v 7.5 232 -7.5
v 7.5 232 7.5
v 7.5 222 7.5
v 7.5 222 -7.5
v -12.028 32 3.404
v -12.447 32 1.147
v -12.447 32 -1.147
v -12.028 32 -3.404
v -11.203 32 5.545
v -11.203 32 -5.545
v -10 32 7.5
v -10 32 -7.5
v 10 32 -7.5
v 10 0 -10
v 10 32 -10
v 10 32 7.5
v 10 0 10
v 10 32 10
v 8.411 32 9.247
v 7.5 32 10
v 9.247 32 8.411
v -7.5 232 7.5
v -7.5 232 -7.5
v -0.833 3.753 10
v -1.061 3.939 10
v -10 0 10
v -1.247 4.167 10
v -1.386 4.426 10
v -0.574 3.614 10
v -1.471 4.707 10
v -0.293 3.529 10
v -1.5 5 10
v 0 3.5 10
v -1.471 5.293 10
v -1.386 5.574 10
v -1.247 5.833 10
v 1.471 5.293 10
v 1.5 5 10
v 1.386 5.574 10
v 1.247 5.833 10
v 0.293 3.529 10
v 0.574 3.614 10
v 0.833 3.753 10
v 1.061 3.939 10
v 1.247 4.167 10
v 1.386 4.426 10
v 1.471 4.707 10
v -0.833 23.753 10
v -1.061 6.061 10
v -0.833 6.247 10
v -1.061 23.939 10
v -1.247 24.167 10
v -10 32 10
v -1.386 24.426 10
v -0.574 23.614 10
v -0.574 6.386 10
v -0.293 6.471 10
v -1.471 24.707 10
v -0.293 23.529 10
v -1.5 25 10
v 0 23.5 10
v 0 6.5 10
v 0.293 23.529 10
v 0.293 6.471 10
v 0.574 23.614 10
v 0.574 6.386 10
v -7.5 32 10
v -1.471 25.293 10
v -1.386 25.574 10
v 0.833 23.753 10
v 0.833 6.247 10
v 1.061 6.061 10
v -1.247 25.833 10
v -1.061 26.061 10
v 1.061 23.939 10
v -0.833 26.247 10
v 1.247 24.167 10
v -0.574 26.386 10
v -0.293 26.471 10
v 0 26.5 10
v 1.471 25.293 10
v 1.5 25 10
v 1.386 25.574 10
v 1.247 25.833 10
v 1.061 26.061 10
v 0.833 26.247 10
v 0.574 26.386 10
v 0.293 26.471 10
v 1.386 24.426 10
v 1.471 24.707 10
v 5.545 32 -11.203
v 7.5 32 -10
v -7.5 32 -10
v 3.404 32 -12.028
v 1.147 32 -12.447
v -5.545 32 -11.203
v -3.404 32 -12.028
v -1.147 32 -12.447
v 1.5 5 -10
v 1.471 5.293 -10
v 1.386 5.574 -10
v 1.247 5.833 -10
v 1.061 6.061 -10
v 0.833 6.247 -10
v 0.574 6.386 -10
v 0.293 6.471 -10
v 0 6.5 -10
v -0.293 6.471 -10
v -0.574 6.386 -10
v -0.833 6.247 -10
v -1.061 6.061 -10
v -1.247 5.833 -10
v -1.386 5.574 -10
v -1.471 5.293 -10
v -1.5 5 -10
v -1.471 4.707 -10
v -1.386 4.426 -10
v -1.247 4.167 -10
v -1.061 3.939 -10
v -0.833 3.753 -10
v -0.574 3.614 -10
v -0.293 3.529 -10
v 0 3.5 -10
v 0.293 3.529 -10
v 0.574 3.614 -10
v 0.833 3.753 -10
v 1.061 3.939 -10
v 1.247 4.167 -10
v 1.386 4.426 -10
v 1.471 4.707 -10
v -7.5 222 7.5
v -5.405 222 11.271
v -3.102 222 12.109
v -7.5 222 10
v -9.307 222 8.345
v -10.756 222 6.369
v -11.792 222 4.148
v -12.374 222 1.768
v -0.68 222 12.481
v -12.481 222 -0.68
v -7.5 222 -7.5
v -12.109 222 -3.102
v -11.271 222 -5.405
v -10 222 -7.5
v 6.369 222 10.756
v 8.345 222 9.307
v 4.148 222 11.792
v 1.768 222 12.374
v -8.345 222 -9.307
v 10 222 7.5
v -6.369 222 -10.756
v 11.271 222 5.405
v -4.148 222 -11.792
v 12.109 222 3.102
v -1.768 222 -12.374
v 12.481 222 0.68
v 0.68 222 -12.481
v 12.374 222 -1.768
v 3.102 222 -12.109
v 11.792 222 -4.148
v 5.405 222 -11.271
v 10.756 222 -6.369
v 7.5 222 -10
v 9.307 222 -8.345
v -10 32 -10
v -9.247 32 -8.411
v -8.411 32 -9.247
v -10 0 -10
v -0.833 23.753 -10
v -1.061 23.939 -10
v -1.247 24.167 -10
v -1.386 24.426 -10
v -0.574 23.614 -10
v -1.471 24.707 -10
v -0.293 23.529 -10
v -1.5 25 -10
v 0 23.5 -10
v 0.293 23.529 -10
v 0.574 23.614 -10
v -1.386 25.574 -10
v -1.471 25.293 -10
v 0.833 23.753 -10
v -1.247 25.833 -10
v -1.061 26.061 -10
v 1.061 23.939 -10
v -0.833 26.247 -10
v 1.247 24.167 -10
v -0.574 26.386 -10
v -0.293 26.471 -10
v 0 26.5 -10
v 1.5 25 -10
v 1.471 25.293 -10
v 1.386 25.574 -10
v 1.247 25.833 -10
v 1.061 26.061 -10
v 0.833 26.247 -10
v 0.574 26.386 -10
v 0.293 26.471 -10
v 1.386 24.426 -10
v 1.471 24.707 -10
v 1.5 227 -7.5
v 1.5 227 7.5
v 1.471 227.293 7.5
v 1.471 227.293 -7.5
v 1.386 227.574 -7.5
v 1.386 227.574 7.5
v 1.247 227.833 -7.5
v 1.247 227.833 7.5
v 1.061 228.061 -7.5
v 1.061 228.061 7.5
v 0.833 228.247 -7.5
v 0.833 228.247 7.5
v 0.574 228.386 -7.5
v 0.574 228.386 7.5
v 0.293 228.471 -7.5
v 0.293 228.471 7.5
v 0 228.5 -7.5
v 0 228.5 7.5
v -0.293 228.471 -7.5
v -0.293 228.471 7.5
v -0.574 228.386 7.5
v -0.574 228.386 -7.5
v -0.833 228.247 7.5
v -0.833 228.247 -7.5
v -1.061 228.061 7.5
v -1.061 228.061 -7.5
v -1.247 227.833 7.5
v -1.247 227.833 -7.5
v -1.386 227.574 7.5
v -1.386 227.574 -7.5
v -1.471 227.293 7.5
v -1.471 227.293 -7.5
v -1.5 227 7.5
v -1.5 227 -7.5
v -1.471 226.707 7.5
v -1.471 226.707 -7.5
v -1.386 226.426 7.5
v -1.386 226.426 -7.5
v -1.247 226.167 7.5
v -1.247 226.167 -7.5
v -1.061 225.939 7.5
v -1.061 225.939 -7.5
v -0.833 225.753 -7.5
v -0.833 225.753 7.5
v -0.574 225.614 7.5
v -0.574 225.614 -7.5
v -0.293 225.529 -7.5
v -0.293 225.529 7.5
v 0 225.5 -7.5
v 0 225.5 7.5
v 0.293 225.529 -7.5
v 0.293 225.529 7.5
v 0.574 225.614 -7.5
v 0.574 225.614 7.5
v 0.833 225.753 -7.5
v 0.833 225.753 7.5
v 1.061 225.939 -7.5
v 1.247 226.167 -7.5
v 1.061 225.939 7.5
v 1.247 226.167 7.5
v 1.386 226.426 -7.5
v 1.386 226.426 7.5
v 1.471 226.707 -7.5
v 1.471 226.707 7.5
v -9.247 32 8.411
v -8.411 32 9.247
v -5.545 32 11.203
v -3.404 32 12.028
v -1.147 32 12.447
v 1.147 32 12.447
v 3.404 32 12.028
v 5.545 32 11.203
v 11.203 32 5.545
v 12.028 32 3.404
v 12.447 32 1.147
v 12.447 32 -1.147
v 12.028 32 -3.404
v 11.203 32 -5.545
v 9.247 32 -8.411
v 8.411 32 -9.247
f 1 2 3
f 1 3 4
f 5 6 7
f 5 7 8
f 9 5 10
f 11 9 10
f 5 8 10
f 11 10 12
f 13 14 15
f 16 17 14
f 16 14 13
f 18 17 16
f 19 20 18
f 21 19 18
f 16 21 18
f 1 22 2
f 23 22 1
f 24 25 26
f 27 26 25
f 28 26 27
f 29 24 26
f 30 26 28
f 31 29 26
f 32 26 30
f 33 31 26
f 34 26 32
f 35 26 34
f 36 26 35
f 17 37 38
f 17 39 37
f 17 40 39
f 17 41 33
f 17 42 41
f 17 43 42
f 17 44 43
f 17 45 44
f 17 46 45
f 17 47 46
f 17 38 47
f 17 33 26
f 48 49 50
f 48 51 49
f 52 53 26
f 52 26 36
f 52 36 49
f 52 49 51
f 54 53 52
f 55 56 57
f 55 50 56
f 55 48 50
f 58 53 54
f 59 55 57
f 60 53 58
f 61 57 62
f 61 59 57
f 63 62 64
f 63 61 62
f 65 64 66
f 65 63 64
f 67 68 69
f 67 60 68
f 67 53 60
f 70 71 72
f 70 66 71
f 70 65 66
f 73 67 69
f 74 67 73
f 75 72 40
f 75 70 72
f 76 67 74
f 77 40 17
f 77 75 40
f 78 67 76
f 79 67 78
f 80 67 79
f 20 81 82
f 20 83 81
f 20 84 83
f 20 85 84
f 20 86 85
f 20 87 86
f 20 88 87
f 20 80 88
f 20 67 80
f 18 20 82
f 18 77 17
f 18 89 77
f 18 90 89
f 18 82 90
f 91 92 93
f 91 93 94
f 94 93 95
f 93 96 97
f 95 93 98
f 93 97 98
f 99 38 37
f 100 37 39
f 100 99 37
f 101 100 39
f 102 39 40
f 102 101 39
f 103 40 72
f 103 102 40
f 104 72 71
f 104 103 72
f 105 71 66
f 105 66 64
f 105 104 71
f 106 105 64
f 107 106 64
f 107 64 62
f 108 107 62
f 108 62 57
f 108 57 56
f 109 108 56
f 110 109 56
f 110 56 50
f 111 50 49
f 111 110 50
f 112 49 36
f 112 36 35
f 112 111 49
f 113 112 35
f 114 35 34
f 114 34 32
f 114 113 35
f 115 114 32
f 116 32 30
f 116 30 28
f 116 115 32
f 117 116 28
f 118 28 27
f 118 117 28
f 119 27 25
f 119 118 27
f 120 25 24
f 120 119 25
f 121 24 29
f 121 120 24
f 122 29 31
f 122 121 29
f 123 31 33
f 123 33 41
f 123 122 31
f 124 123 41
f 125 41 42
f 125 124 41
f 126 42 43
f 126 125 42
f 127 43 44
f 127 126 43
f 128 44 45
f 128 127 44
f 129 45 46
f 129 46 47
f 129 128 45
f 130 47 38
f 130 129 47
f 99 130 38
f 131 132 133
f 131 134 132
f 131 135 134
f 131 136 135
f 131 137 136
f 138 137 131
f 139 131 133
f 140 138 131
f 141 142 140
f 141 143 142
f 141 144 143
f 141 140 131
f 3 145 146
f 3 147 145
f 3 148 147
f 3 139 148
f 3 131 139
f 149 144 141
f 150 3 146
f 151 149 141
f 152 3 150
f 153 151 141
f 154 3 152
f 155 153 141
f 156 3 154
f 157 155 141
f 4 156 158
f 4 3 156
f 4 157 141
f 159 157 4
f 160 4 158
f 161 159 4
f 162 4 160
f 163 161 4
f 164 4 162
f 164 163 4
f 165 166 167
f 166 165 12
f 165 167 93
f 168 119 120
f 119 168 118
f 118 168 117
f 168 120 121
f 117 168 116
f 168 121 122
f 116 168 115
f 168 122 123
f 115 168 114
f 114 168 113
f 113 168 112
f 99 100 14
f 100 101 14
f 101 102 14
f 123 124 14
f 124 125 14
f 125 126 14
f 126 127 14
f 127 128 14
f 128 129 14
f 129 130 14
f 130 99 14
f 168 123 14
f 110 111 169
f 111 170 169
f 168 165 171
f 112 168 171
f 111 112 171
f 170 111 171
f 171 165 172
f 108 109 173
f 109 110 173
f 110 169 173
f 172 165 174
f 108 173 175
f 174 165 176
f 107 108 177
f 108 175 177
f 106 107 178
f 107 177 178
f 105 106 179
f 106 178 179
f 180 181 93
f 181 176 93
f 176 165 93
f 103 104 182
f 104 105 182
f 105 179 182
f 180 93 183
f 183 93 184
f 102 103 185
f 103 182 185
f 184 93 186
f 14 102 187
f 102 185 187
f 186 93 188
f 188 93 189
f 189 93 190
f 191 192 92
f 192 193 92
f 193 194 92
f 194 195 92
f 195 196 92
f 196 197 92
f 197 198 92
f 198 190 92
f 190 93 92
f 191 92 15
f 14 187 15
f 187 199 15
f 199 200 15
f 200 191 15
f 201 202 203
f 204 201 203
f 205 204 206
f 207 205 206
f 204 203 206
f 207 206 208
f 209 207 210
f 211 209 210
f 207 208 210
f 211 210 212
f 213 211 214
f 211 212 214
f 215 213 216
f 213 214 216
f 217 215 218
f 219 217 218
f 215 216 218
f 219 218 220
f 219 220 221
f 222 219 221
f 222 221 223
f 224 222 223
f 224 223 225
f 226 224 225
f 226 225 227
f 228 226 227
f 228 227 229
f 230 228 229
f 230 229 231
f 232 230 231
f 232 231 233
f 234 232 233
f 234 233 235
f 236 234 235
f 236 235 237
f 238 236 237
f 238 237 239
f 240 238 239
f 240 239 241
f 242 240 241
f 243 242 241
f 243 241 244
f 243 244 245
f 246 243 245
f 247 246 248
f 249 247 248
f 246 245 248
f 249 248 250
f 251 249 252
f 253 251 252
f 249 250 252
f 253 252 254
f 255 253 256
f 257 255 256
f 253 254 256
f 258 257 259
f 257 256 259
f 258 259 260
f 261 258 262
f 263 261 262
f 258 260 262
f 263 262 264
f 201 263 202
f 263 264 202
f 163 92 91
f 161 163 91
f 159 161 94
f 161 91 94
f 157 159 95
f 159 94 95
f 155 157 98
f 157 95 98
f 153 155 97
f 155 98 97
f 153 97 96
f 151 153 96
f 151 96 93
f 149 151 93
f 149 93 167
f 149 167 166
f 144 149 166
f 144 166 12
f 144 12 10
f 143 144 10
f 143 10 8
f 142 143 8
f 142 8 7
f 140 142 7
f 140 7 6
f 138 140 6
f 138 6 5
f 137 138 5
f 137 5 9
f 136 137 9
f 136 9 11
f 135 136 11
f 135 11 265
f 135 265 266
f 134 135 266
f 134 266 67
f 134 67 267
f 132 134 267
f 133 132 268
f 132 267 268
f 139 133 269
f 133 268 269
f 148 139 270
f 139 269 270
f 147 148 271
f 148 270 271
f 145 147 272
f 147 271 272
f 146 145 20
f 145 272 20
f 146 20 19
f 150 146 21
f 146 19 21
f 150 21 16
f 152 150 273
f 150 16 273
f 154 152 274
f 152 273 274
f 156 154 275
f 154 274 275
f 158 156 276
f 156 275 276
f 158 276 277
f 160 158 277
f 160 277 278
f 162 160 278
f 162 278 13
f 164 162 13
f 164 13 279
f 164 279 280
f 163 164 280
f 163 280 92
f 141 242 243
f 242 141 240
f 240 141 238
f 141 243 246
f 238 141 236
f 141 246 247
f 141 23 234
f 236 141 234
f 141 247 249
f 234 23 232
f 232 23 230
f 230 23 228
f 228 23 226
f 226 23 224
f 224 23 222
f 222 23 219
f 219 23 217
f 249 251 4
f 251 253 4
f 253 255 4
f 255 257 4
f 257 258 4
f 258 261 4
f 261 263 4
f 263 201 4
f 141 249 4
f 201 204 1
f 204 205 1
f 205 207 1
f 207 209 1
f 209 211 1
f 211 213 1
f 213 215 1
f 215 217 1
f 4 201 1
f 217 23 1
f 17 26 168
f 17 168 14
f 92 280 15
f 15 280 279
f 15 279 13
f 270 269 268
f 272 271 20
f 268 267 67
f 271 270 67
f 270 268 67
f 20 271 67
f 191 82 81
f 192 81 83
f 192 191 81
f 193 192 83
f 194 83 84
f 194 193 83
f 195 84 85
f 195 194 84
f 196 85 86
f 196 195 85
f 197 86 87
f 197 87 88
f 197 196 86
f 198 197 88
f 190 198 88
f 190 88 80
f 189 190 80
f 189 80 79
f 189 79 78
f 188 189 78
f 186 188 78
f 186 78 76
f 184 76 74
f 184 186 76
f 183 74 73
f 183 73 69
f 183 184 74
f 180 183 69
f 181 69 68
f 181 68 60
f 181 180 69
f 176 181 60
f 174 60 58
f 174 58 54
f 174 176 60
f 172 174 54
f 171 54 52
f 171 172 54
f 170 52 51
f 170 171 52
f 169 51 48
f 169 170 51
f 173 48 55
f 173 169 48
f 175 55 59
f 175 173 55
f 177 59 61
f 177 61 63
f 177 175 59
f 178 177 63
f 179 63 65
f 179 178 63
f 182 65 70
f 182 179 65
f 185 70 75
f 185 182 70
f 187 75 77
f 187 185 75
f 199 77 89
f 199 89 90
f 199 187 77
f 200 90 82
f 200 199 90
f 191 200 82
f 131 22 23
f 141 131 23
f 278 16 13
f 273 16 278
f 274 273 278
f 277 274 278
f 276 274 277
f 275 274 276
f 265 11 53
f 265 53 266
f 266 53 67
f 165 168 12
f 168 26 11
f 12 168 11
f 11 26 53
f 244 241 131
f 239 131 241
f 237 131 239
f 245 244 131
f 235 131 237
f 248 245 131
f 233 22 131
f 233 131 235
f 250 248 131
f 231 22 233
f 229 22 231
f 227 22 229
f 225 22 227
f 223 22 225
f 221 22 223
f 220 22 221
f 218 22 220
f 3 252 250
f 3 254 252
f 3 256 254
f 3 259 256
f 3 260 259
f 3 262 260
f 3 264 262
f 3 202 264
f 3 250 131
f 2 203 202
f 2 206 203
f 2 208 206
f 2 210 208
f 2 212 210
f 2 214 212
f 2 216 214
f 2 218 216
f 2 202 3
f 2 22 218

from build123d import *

# Parameters (mm, degrees)
SKETCH1_W           = 20
SKETCH1_H           = 32
SKETCH1_R           = 1.5
BOSS_EXTRUDE1_DEPTH = 10
SKETCH3_R           = 12.5
BOSS_EXTRUDE2_DEPTH = 200
SKETCH4_OUTSIDE_W   = 73.936
SKETCH4_OUTSIDE_H   = 73.936
SKETCH4_OUTSIDE_W_2 = 15
SKETCH4_OUTSIDE_H_2 = 15
CUT_EXTRUDE1_DEPTH  = 10
SKETCH5_R           = 1.5
CUT_EXTRUDE2_DEPTH  = 234.195733237


with BuildPart() as part:
    # Sketch1 → Boss-Extrude1 (new, symmetric)
    with BuildSketch(Plane.XY):
        with Locations((0, 16)):
            Rectangle(SKETCH1_W, SKETCH1_H)
        with Locations((0, 5)):
            Circle(SKETCH1_R, mode=Mode.SUBTRACT)
        with Locations((0, 25)):
            Circle(SKETCH1_R, mode=Mode.SUBTRACT)
    extrude(amount=BOSS_EXTRUDE1_DEPTH, both=True)

    # Sketch3 → Boss-Extrude2 (add)
    with BuildSketch(Plane(origin=(0, 32, 0), x_dir=(1, 0, 0), z_dir=(0, 1, 0))):
        with Locations(Location((0, 0, 0), (0, 0, 53.130102354))):
            Circle(SKETCH3_R)
    extrude(amount=BOSS_EXTRUDE2_DEPTH)

    # Sketch4 outside → Cut-Extrude1 (cut)
    with BuildSketch(Plane(origin=(0, 232, 0), x_dir=(1, 0, 0), z_dir=(0, 1, 0))):
        Rectangle(SKETCH4_OUTSIDE_W, SKETCH4_OUTSIDE_H)
        Rectangle(SKETCH4_OUTSIDE_W_2, SKETCH4_OUTSIDE_H_2, mode=Mode.SUBTRACT)
    extrude(amount=-CUT_EXTRUDE1_DEPTH, mode=Mode.SUBTRACT)

    # Sketch5 → Cut-Extrude2 (cut, through all)
    with BuildSketch(Plane.XY.offset(7.5)):
        with Locations((0, 227)):
            Circle(SKETCH5_R)
    extrude(amount=-CUT_EXTRUDE2_DEPTH, mode=Mode.SUBTRACT)


solid = part.part
